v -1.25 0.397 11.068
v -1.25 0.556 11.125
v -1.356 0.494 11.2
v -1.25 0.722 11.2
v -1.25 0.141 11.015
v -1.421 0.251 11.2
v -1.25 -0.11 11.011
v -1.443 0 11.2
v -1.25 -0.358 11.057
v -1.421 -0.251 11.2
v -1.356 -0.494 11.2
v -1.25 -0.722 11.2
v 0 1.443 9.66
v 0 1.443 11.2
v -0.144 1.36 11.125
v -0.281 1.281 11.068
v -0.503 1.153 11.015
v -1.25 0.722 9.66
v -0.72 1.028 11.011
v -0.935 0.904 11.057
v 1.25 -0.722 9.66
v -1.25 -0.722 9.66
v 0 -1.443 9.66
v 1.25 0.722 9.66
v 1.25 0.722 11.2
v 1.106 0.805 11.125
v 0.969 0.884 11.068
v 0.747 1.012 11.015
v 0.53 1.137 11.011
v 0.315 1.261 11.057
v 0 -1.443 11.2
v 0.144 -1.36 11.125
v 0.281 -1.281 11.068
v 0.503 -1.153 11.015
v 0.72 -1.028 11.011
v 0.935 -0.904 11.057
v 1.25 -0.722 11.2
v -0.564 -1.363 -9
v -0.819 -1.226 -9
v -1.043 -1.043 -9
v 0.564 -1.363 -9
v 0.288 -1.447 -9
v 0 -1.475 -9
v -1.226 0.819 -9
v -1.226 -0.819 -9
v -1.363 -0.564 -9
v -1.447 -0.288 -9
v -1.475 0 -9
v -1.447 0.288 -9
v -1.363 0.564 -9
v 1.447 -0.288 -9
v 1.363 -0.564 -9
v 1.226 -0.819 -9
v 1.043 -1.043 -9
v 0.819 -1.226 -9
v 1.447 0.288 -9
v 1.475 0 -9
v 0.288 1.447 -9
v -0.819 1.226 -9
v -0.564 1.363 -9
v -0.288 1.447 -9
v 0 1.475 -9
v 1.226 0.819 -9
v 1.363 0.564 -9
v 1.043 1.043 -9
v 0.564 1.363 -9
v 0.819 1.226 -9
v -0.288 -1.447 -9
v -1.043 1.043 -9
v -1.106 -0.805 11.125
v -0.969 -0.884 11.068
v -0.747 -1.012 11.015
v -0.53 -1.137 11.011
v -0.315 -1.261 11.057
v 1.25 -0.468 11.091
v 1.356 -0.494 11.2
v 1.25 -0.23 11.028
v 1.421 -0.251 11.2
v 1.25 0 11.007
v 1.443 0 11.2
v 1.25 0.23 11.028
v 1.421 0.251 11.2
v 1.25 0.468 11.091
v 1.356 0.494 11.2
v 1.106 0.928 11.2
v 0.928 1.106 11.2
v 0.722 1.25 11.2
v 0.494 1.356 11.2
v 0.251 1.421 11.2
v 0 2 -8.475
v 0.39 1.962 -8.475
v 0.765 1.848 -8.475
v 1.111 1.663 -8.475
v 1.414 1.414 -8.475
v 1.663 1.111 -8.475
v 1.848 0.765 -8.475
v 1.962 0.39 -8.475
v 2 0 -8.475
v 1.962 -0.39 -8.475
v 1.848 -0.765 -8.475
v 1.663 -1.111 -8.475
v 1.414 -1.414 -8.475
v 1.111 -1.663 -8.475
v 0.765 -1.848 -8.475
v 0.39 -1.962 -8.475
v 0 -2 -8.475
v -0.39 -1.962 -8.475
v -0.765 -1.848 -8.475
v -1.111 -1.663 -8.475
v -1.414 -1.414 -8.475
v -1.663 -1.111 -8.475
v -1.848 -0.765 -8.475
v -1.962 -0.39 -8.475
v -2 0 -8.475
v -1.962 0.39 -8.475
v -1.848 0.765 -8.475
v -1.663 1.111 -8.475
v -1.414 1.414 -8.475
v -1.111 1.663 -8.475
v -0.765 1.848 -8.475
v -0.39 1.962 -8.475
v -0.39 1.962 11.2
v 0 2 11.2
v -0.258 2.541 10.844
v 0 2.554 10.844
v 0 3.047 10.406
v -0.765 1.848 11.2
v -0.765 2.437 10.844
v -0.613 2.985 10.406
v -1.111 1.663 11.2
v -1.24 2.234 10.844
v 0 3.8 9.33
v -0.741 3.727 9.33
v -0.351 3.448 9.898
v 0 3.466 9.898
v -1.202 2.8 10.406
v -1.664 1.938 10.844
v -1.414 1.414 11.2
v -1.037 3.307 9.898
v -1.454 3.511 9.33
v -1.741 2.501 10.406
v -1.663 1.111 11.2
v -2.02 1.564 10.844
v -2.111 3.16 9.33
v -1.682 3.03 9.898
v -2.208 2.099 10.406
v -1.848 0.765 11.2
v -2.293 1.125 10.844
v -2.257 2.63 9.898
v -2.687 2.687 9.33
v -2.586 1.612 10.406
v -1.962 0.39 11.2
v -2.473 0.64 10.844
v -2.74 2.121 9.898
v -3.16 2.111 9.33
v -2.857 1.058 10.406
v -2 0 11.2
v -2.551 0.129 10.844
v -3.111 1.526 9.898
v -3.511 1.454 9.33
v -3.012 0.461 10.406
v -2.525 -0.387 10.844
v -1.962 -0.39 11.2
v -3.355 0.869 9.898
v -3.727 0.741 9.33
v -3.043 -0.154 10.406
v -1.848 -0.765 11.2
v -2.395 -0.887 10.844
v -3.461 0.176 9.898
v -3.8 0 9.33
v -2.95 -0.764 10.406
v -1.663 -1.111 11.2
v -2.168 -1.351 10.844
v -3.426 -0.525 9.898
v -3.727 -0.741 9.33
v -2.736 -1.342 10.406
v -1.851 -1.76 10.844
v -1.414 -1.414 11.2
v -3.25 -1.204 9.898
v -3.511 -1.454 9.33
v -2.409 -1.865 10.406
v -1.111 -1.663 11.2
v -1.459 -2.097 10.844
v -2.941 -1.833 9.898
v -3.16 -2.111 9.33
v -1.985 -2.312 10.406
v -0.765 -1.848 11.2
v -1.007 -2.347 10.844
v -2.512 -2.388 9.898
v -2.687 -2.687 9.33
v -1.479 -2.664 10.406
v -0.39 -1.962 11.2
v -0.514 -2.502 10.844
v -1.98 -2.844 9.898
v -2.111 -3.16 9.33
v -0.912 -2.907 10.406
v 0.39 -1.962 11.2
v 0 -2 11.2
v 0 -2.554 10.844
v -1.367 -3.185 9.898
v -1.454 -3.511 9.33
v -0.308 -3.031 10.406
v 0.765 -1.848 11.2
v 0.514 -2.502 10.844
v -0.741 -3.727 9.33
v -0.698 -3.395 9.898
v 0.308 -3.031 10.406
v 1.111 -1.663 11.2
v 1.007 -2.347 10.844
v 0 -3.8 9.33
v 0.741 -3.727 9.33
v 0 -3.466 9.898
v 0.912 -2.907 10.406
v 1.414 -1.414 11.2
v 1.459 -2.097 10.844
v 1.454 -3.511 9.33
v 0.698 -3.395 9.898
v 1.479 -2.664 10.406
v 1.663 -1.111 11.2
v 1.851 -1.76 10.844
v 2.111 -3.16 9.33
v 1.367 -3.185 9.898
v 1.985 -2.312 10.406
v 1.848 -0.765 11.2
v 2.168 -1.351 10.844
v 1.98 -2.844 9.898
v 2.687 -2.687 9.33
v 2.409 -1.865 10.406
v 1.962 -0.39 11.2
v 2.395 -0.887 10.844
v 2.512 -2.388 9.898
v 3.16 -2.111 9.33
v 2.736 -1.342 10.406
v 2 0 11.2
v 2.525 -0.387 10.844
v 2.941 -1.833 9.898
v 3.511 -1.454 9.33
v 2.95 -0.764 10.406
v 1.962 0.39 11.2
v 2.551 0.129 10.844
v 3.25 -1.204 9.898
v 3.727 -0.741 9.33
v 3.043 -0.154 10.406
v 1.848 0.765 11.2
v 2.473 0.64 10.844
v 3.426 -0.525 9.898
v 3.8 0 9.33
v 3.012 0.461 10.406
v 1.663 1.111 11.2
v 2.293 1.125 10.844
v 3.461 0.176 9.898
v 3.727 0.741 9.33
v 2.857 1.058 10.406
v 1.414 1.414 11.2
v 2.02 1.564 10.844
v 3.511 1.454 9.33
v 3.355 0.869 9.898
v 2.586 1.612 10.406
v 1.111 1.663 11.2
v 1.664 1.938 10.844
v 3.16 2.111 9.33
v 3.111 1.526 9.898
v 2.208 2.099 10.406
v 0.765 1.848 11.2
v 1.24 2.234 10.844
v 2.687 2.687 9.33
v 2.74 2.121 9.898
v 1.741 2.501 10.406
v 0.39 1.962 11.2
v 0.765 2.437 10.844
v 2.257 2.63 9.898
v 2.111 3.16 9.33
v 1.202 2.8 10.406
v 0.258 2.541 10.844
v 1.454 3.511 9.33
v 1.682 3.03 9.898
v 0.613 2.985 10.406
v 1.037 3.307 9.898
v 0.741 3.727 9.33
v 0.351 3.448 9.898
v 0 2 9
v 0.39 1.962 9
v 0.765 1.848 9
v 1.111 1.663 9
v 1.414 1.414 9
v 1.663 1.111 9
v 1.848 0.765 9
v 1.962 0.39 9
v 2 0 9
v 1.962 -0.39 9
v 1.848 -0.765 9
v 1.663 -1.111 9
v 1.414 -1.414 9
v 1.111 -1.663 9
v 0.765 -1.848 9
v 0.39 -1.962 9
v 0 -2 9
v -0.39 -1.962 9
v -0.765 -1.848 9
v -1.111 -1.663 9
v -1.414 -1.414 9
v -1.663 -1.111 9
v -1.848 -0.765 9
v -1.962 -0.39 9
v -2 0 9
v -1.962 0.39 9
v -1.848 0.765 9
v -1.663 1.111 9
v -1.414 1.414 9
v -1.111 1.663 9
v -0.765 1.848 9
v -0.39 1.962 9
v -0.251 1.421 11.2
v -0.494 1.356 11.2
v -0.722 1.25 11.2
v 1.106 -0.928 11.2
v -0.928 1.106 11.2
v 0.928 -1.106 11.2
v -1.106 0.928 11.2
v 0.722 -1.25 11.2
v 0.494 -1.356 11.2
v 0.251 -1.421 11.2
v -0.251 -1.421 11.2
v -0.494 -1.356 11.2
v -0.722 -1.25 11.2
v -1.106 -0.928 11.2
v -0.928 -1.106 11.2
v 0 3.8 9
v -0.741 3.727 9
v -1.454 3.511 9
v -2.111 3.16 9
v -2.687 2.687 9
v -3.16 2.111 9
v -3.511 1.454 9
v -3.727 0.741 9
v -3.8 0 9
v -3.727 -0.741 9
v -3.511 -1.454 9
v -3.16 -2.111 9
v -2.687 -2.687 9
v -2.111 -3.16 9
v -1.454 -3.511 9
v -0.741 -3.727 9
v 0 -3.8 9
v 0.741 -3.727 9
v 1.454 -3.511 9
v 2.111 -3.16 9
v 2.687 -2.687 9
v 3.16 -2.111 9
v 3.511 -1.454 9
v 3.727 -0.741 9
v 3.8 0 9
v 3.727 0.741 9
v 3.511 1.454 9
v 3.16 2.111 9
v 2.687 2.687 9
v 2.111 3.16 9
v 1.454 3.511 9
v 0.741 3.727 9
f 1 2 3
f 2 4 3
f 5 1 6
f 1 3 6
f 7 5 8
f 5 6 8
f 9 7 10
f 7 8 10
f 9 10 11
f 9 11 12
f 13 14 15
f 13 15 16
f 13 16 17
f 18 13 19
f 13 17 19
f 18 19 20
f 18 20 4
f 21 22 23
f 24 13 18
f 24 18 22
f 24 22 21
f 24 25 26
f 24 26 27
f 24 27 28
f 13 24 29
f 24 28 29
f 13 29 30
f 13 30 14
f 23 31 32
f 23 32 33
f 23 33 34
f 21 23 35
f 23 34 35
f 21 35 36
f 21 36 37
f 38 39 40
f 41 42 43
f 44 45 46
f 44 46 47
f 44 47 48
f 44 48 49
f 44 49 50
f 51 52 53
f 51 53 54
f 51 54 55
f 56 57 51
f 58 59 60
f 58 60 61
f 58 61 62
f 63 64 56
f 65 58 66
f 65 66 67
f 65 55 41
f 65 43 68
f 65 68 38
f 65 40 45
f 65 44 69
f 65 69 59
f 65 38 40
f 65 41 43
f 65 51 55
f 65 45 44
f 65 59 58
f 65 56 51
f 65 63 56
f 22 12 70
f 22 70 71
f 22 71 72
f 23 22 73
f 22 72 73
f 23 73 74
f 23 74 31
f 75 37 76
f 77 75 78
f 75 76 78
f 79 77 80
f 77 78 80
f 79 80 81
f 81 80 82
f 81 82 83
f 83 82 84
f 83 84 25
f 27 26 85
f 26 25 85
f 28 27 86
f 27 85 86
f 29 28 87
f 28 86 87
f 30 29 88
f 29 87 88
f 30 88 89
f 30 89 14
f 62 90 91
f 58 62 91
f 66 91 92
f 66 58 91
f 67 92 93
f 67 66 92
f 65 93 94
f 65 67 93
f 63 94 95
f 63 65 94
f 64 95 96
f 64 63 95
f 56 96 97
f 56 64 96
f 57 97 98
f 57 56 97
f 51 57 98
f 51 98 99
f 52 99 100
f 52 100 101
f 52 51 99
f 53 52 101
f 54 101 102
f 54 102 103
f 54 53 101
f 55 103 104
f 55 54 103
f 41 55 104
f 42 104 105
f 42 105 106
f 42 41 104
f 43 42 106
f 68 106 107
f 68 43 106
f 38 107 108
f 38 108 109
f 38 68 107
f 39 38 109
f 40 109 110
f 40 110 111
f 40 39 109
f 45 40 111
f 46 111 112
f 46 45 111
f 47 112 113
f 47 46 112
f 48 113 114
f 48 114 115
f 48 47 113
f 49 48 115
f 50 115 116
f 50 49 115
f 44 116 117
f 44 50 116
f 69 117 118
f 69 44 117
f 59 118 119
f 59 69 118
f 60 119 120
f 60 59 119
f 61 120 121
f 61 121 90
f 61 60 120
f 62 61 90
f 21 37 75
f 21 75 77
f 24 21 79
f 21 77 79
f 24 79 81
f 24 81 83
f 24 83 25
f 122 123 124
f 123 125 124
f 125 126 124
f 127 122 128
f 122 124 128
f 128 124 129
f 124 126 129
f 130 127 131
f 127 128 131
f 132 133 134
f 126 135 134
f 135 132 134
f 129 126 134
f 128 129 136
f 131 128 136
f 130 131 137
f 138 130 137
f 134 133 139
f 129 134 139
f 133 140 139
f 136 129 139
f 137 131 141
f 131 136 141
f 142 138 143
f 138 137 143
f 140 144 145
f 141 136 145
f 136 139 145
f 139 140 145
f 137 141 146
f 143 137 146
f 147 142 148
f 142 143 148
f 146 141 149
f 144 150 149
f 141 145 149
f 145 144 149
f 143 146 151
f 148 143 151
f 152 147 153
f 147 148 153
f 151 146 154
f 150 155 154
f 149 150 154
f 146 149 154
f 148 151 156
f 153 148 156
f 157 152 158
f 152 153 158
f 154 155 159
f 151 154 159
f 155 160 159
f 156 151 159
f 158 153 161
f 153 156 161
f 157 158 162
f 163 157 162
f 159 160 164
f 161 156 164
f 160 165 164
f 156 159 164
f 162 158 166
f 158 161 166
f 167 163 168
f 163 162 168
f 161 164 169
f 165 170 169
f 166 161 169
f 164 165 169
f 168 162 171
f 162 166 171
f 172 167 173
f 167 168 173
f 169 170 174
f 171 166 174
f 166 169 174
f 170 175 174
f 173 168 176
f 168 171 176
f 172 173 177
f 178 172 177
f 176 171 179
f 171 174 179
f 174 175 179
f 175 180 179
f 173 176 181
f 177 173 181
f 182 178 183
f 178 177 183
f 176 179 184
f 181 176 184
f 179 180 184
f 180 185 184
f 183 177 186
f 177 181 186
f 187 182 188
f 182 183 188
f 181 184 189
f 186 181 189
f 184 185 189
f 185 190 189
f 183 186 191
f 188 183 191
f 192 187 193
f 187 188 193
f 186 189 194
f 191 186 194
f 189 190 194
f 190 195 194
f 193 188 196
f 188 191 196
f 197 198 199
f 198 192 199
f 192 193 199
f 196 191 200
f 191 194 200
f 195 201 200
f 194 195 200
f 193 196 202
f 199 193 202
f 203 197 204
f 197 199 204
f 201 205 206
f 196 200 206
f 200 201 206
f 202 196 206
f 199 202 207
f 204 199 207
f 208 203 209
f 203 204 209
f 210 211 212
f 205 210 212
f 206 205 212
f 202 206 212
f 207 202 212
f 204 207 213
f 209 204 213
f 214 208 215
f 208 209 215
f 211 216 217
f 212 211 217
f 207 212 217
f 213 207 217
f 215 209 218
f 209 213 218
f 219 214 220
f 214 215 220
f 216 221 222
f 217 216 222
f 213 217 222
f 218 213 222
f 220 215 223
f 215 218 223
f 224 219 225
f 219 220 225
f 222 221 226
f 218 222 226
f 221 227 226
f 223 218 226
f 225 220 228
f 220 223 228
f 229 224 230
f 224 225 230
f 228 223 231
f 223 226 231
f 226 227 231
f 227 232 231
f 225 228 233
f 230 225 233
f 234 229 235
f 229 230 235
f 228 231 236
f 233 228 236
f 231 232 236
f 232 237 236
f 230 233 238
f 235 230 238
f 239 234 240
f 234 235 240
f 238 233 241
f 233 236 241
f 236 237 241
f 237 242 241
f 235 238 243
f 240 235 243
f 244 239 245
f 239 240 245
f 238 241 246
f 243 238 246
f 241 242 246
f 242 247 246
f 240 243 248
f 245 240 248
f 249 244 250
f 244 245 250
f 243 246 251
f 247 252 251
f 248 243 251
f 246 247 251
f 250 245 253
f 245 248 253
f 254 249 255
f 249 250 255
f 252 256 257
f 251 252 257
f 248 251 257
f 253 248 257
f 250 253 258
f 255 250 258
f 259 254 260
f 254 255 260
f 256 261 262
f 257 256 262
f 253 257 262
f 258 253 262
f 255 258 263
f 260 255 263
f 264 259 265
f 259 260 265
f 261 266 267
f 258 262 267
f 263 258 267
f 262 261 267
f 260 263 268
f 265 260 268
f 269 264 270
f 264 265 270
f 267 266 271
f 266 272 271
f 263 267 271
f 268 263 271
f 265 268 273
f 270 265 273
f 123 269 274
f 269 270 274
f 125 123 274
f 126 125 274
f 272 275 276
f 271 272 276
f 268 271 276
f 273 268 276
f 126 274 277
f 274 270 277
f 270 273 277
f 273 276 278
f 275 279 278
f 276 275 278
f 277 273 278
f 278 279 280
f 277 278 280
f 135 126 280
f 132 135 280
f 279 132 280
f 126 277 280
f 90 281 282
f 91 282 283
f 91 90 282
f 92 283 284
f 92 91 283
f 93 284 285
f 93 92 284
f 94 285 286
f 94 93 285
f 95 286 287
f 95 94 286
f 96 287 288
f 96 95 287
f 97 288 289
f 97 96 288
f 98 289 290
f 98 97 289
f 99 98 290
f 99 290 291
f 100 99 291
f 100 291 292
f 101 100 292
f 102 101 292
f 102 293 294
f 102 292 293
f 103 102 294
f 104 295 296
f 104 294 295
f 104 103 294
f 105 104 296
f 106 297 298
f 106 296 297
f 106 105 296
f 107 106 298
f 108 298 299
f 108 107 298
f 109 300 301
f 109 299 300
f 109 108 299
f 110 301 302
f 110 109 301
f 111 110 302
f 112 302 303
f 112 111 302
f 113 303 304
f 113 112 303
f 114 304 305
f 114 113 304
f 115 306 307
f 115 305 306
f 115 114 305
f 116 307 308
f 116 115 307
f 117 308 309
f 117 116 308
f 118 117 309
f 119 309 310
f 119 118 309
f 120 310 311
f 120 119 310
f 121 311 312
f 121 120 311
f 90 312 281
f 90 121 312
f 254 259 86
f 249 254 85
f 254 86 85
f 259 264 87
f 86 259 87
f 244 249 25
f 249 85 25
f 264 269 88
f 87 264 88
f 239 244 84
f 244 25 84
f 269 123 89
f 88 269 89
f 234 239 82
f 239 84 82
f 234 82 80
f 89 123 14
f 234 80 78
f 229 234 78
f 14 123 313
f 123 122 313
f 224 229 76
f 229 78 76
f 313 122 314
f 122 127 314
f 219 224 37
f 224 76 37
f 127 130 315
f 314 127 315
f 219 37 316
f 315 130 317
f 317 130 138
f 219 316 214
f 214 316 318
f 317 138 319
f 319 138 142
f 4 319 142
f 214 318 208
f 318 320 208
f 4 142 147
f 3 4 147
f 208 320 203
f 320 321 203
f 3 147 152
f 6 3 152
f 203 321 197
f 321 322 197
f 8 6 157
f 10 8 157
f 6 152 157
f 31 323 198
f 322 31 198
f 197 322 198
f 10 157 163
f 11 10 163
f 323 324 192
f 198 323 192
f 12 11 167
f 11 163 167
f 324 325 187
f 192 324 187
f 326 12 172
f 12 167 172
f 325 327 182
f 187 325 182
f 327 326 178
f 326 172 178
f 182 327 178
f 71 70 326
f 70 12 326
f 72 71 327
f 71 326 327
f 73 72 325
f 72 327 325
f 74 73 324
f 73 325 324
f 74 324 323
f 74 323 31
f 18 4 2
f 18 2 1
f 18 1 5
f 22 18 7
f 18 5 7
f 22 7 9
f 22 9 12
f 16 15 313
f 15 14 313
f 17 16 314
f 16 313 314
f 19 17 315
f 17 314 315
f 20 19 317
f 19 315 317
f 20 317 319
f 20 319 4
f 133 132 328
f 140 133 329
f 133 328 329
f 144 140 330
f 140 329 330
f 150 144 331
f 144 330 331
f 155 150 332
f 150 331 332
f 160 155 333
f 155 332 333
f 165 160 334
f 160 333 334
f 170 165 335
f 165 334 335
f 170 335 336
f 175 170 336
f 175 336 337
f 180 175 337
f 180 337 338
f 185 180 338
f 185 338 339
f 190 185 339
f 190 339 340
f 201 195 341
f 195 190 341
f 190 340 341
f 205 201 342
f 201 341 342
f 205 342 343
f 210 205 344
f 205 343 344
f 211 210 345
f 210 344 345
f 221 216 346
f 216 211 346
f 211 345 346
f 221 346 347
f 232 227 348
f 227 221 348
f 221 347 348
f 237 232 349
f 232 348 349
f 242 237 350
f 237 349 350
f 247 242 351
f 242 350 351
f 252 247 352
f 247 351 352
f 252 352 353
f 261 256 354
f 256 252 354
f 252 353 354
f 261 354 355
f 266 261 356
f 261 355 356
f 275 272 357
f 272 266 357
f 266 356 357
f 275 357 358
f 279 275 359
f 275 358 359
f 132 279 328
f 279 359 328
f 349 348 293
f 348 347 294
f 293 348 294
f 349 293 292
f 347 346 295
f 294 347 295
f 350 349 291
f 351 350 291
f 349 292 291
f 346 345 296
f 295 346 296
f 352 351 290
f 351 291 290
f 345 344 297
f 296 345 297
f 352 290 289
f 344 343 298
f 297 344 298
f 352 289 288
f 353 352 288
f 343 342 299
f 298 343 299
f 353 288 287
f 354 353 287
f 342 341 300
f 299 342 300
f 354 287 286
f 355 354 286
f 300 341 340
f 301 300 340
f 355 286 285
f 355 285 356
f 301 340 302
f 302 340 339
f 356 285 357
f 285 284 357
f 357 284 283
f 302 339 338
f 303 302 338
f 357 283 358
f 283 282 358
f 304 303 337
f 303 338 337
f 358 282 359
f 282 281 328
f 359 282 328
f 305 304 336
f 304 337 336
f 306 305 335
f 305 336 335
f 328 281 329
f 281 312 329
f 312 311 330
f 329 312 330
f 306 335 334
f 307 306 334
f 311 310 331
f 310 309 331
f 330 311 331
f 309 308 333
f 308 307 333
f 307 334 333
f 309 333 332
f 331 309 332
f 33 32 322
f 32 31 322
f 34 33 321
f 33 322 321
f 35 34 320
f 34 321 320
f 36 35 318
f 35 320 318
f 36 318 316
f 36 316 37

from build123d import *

# Parameters (mm, degrees)
CUT_EXTRUDE2_DEPTH = 1.54


with BuildPart() as part:
    # Sketch10 → Revolve3 (revolve)
    with BuildSketch(Plane(origin=(0, 0, 0), x_dir=(0, 0, -1), z_dir=(1, 0, 0))):
        Polygon((8.475, 2), (9, 1.475), (9, 0), (-9, 0), (-9, 2), align=None)
    revolve(axis=Axis((0, 0, 11.2), (0, 0, -1)))

    # Sketch7 → Revolve2 (revolve)
    with BuildSketch(Plane(origin=(0, 0, 0), x_dir=(0, 0, -1), z_dir=(1, 0, 0))):
        with BuildLine():
            Line((-9.33, 3.8), (-9, 3.8))
            Line((-9, 3.8), (-9, 0))
            Line((-9, 0), (-11.2, 0))
            Line((-11.2, 0), (-11.2, 2))
            ThreePointArc((-11.2, 2), (-10.406499853, 3.047002626), (-9.33, 3.8))
        make_face()
    revolve(axis=Axis((0, 0, 11.2), (0, 0, -1)))

    # Sketch5 → Cut-Extrude2 (cut)
    with BuildSketch(Plane.XY.offset(11.2)):
        Polygon((1.25, -0.721687836), (1.25, 0.721687836), (0, 1.443375673), (-1.25, 0.721687836), (-1.25, -0.721687836), (0, -1.443375673), align=None)
    extrude(amount=-CUT_EXTRUDE2_DEPTH, mode=Mode.SUBTRACT)

    # Cut-Extrude3 cone 1 section (through the dimple's axis) → Cut-Extrude3 (revolve, cut)
    with BuildSketch(Plane(origin=(0, 0, 11.2), x_dir=(0, -1, 0), z_dir=(1, 0, 0))):
        Polygon((0, 0), (1.443375673, 0), (0, 1.443375673), align=None)
    revolve(axis=Axis((0, 0, 11.2), (0, 0, -1)), mode=Mode.SUBTRACT)


solid = part.part
